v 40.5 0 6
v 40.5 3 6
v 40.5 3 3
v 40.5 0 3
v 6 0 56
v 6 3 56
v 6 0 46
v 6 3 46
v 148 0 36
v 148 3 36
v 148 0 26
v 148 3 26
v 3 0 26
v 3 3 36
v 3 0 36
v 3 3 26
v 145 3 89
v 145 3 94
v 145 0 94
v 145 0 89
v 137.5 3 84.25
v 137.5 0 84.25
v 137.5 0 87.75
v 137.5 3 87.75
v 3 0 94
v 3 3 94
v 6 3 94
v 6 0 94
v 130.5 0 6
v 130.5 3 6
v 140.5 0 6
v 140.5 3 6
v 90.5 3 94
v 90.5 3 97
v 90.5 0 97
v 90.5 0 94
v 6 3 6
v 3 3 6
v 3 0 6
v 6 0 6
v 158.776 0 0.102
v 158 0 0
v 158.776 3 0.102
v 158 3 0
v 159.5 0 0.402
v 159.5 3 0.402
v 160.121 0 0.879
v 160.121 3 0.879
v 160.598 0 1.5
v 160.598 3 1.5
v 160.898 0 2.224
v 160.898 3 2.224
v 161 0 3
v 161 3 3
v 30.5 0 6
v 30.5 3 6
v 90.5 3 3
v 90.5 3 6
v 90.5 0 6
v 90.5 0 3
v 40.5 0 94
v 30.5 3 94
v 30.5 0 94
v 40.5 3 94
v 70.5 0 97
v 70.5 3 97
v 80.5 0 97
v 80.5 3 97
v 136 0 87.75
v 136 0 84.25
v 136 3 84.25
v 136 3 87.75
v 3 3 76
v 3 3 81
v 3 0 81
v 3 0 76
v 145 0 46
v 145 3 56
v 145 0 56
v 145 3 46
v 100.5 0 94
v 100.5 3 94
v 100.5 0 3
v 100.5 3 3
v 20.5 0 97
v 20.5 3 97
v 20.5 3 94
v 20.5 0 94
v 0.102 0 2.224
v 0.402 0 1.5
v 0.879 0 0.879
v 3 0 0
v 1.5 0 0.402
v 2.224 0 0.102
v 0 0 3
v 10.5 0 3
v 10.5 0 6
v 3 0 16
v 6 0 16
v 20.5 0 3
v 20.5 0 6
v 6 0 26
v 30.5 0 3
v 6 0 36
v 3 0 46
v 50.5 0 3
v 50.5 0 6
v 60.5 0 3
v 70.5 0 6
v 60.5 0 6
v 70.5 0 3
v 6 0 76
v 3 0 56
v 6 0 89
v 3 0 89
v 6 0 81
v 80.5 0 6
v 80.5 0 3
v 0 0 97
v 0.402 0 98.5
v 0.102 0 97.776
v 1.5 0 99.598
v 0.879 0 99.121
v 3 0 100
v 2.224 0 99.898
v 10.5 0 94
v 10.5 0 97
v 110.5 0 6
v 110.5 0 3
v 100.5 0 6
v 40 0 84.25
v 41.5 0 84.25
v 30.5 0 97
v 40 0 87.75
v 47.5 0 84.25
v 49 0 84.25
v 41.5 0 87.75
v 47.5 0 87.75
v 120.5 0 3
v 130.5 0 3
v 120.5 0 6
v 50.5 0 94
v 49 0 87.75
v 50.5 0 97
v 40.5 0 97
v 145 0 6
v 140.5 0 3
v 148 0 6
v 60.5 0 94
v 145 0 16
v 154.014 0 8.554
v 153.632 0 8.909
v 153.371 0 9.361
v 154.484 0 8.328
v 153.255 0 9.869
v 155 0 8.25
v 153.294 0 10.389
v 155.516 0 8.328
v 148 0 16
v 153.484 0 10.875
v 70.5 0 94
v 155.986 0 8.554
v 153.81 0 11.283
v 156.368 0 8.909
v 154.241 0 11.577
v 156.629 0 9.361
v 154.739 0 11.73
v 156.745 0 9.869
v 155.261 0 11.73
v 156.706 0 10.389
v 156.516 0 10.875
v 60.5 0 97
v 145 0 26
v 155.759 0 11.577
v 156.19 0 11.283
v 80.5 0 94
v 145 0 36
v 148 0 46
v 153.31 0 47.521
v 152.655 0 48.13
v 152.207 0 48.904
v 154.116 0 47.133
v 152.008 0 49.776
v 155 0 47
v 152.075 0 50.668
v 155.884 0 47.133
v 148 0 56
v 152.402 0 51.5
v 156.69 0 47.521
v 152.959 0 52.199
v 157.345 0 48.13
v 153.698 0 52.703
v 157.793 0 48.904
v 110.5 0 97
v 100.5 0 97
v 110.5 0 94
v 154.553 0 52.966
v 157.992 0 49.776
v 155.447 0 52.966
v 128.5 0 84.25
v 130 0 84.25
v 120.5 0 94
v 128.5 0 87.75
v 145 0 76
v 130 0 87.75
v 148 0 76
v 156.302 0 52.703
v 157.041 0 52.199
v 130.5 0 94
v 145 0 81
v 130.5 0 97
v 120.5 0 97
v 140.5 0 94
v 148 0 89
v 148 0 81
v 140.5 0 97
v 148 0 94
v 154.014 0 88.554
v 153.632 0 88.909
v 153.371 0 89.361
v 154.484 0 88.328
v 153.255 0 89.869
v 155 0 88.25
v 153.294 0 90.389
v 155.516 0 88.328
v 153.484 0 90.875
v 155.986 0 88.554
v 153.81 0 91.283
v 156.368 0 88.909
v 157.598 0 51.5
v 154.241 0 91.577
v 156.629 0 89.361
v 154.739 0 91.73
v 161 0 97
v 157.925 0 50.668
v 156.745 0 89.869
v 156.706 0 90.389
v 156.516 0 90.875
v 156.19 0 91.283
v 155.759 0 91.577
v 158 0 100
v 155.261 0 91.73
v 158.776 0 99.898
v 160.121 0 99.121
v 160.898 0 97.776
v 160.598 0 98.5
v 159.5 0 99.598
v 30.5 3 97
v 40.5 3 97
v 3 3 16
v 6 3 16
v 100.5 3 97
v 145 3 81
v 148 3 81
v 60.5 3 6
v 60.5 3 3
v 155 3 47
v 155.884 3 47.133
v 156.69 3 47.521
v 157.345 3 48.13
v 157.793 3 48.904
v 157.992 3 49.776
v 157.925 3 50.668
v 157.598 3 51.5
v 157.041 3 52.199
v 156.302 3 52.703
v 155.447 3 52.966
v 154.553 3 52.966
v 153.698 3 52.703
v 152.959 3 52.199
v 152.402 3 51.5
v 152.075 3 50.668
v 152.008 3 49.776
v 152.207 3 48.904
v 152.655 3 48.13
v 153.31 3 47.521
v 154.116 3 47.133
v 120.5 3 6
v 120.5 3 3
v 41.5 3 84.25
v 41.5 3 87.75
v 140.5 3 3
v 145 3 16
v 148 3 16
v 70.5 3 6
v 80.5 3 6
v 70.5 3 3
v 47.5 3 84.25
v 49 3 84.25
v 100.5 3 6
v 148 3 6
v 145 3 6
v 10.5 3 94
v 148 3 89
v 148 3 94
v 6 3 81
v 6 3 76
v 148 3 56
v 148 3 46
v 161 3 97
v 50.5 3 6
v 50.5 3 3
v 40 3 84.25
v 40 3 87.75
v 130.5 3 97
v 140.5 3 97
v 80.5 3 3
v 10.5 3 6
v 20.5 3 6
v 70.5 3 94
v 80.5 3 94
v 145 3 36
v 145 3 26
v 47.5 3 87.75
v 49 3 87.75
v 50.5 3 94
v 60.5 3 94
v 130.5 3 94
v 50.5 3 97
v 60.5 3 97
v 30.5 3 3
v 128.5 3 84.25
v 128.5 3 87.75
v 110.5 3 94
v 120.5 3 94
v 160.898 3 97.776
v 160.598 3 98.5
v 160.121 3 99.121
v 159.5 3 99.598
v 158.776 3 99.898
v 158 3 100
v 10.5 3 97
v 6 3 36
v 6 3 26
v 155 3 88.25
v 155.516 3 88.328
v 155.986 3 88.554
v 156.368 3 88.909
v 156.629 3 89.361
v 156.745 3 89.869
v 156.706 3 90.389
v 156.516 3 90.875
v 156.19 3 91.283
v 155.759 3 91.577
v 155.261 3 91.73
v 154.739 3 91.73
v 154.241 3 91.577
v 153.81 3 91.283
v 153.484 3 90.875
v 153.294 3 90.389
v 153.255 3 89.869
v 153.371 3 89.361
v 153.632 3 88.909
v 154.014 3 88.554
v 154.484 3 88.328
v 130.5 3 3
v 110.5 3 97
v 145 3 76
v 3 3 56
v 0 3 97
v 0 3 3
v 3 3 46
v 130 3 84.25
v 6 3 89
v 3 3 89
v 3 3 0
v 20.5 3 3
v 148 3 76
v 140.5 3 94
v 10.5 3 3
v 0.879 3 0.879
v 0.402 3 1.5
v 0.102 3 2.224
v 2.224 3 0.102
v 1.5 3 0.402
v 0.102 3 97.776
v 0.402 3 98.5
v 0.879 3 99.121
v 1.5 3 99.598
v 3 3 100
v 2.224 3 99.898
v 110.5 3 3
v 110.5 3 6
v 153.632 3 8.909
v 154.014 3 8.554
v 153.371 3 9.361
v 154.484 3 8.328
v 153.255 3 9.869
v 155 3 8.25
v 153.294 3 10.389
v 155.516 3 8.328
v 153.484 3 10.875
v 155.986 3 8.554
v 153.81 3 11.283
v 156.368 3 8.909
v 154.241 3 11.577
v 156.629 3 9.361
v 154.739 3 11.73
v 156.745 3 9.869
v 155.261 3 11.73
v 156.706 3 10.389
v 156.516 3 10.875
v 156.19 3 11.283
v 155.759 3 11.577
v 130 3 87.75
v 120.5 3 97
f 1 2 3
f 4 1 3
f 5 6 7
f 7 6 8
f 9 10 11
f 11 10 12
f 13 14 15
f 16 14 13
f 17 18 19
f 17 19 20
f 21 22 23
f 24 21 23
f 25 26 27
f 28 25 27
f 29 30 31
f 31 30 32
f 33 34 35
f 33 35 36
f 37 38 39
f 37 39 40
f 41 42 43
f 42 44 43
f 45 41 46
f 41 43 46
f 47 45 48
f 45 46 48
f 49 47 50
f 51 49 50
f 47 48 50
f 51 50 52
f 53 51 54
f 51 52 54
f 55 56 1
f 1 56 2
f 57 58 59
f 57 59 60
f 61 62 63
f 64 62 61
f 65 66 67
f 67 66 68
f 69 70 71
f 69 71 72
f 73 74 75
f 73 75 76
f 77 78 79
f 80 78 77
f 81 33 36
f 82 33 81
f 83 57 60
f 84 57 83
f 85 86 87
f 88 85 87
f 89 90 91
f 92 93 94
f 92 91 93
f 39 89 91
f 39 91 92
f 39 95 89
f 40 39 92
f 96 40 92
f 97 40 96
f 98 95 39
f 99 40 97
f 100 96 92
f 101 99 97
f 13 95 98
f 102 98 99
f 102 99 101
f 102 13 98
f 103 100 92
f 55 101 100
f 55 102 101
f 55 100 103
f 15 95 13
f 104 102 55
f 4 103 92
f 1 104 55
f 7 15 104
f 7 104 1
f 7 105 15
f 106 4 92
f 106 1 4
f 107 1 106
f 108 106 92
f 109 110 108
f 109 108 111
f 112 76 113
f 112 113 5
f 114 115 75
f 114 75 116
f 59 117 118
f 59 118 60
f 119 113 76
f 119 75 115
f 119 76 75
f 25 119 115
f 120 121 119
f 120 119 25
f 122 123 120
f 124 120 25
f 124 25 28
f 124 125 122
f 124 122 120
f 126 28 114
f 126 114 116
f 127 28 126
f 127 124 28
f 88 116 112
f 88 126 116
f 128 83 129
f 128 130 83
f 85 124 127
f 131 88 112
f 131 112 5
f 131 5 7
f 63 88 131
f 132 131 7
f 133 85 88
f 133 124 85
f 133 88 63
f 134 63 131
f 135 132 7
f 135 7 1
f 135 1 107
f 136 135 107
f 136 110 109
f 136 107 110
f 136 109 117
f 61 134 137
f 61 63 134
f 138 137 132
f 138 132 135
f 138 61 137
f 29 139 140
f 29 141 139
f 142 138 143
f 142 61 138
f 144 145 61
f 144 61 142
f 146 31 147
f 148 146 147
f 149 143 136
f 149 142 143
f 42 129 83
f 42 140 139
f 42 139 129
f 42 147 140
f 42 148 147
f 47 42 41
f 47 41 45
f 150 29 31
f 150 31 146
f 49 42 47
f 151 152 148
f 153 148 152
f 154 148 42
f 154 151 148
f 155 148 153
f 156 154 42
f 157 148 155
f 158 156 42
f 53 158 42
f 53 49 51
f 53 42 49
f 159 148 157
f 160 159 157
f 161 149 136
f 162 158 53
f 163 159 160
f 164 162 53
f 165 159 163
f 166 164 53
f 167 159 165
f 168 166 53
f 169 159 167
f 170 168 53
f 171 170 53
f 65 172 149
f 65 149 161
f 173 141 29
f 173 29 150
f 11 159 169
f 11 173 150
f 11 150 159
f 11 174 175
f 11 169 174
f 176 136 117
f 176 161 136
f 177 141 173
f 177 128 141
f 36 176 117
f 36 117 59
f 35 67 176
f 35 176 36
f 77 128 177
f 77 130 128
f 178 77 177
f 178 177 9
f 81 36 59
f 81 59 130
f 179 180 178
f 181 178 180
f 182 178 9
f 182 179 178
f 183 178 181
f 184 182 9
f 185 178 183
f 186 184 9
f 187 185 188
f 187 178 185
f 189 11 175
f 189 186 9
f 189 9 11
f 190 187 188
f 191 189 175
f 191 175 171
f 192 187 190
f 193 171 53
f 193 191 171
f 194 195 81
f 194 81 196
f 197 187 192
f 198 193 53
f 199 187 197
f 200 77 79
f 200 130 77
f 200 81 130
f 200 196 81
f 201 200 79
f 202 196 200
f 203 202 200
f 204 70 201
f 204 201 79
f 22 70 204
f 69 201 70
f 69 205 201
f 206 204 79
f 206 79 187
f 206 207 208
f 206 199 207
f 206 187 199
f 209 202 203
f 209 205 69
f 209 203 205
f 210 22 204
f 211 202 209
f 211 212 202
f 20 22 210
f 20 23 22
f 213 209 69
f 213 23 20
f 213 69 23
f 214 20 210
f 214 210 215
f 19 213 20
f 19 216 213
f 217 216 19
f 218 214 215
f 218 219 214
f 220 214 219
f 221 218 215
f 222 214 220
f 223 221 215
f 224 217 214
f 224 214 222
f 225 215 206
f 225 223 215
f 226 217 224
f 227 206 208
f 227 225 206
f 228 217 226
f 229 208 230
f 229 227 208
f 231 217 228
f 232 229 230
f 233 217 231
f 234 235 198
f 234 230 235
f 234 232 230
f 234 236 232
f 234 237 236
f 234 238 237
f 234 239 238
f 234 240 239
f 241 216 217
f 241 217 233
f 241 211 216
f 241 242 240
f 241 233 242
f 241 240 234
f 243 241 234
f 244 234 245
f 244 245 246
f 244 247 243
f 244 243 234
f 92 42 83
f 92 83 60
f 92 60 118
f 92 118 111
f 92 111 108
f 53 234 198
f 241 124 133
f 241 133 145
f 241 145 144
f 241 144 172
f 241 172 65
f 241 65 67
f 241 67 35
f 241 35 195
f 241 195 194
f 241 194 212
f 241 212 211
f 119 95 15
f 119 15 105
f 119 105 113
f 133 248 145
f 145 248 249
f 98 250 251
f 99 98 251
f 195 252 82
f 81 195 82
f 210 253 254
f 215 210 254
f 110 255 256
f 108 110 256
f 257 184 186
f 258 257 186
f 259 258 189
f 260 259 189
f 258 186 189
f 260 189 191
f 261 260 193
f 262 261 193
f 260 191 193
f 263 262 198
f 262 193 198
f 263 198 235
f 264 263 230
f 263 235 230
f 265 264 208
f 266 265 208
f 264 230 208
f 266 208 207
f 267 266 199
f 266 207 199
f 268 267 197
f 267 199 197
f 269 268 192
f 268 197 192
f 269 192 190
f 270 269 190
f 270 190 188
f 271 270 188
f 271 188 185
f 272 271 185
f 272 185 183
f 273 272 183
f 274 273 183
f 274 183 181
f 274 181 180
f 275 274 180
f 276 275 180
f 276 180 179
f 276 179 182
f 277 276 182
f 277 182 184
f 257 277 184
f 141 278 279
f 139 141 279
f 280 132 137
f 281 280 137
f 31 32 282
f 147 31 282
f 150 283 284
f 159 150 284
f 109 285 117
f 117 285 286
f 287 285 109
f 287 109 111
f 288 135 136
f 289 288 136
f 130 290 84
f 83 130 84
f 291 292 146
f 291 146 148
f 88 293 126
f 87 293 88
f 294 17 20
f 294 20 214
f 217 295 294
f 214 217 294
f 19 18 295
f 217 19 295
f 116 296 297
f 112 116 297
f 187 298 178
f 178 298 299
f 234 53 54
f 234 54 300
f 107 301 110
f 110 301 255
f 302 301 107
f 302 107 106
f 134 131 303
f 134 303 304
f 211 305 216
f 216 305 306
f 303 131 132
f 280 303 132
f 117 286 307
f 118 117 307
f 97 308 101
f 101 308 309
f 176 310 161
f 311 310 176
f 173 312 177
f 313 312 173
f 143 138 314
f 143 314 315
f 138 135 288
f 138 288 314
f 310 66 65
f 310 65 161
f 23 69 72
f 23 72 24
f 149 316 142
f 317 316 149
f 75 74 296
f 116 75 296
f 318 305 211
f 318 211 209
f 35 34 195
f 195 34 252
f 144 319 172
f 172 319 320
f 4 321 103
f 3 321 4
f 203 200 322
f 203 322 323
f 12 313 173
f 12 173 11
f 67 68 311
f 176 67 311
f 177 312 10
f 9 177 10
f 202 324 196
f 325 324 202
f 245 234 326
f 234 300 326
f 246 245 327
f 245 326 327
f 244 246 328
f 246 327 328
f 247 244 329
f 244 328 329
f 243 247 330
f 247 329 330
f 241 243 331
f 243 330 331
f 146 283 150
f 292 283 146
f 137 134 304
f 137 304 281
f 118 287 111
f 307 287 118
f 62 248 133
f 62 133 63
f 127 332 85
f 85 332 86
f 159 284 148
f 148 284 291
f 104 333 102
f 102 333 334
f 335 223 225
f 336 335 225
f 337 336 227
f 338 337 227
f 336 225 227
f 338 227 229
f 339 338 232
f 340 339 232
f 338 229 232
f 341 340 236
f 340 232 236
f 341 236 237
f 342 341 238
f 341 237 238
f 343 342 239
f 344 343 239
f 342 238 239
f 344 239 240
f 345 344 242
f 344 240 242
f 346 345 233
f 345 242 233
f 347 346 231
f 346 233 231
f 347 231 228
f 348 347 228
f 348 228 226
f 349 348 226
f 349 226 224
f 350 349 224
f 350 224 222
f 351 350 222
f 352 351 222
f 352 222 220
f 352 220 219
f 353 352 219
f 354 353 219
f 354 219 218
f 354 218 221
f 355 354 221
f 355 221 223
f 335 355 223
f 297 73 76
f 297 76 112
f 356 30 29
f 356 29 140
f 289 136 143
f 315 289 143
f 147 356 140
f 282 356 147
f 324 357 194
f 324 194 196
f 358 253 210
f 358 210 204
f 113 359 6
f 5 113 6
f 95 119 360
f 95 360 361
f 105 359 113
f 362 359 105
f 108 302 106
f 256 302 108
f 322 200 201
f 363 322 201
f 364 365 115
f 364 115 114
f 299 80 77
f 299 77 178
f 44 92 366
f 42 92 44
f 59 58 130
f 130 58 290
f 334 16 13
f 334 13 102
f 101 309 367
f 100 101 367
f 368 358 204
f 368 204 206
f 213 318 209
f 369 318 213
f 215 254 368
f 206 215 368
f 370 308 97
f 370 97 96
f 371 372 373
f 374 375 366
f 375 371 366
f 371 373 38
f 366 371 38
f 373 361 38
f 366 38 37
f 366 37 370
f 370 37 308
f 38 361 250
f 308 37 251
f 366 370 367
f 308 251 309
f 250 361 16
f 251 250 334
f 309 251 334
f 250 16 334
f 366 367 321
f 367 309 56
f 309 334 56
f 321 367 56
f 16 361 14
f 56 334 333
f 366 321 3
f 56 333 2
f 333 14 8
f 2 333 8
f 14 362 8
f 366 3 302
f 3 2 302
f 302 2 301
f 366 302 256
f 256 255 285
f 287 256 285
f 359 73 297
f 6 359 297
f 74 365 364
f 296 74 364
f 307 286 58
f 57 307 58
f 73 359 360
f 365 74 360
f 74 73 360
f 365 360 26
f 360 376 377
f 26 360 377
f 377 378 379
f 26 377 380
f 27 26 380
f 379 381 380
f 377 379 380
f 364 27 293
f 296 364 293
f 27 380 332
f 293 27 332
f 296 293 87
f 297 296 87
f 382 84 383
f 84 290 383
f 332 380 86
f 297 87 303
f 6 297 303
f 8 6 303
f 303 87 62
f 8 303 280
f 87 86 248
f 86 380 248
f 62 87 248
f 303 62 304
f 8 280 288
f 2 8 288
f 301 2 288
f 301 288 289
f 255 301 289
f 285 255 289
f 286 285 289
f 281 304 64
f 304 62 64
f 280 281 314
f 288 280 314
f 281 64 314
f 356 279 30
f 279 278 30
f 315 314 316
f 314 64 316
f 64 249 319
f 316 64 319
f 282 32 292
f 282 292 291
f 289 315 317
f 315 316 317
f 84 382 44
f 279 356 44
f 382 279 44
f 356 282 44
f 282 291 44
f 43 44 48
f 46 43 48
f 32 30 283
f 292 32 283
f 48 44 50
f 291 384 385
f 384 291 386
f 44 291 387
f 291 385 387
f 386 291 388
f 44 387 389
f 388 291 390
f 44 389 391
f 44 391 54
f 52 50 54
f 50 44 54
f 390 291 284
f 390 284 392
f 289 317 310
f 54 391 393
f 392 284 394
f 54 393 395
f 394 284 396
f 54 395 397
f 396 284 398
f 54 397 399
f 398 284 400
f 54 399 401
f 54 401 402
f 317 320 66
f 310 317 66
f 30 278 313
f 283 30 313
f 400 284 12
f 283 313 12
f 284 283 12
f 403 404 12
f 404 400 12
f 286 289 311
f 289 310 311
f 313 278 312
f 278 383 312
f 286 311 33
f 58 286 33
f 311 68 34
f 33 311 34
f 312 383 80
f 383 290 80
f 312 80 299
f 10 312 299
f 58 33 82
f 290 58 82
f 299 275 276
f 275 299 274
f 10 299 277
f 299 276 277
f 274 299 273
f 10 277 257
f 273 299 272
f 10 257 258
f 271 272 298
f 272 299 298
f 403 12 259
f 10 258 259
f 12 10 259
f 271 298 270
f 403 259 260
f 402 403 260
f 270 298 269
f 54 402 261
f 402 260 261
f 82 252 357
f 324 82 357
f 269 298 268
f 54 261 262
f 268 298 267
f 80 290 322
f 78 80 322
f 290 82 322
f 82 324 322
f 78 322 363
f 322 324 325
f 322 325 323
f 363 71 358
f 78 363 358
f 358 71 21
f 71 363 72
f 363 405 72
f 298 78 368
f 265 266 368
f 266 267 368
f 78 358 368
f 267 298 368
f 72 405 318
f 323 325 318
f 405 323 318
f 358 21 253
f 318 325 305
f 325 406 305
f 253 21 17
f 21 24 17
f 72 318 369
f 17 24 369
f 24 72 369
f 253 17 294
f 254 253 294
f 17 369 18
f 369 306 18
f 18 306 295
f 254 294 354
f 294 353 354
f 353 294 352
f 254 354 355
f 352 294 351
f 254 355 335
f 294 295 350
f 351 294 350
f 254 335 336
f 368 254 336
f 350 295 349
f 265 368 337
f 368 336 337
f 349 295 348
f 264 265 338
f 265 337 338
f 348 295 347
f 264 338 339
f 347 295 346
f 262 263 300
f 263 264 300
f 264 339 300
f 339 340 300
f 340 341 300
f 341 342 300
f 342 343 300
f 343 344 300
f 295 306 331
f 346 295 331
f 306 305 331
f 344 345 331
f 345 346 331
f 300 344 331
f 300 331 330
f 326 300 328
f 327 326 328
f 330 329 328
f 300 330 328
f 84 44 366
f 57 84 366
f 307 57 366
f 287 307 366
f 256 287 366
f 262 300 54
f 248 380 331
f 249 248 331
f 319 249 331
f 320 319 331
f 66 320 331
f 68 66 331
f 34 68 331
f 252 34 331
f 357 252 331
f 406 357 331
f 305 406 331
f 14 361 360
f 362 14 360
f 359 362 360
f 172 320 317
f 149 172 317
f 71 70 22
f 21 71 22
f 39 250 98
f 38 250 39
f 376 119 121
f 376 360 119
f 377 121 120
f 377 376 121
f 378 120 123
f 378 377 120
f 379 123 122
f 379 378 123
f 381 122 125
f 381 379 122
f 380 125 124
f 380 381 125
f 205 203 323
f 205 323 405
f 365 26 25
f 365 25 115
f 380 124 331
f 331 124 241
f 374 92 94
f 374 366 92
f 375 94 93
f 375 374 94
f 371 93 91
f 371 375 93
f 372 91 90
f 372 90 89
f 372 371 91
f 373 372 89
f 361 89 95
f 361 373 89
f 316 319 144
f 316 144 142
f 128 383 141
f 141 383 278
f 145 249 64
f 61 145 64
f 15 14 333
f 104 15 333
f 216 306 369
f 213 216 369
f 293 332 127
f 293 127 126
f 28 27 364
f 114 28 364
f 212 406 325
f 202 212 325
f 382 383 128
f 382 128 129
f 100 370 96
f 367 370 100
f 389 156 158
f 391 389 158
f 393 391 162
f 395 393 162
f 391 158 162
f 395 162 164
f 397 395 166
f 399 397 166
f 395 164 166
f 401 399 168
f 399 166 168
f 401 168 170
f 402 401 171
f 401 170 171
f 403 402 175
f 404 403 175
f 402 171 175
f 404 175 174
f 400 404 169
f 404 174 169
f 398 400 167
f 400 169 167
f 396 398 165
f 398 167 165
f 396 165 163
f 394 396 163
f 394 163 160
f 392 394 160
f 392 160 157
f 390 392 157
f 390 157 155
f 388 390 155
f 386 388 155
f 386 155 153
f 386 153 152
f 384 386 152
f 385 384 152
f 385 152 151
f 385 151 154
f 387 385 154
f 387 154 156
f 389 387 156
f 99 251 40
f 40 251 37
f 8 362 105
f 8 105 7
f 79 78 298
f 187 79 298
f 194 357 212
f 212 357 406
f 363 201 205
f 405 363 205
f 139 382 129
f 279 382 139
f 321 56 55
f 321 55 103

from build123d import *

# Parameters (mm, degrees)
SKETCH1_W           = 151
SKETCH1_H           = 100
BOSS_EXTRUDE1_DEPTH = 3
SKETCH3_W           = 1.5
SKETCH3_H           = 3.5
CUT_EXTRUDE1_DEPTH  = 182.13530854
SKETCH4_W           = 10
SKETCH4_H           = 100
BOSS_EXTRUDE2_DEPTH = 3
SKETCH5_R           = 3
SKETCH5_R_2         = 1.75
CUT_EXTRUDE2_DEPTH  = 190.552103655
FILLET1_R           = 3
FILLET2_R           = 3
SKETCH6_W           = 3
SKETCH6_H           = 5
SKETCH6_H_2         = 10
SKETCH6_W_2         = 10
SKETCH6_H_3         = 3
CUT_EXTRUDE3_DEPTH  = 190.552103655


with BuildPart() as part:
    # Sketch1 → Boss-Extrude1 (new body)
    with BuildSketch(Plane(origin=(0, 0, 0), x_dir=(1, 0, 0), z_dir=(0, 1, 0))):
        with Locations((75.5, -50)):
            Rectangle(SKETCH1_W, SKETCH1_H)
    extrude(amount=BOSS_EXTRUDE1_DEPTH)

    # Sketch3 → Cut-Extrude1 (cut, through all)
    with BuildSketch(Plane.XZ):
        with Locations((40.75, 86)):
            Rectangle(SKETCH3_W, SKETCH3_H)
        with Locations((48.25, 86)):
            Rectangle(SKETCH3_W, SKETCH3_H)
        with Locations((129.25, 86)):
            Rectangle(SKETCH3_W, SKETCH3_H)
        with Locations((136.75, 86)):
            Rectangle(SKETCH3_W, SKETCH3_H)
    extrude(amount=-CUT_EXTRUDE1_DEPTH, mode=Mode.SUBTRACT)

    # Sketch4 → Boss-Extrude2 (add, through all)
    with BuildSketch(Plane.XZ):
        with Locations((156, 50)):
            Rectangle(SKETCH4_W, SKETCH4_H)
    extrude(amount=-BOSS_EXTRUDE2_DEPTH)

    # Sketch5 → Cut-Extrude2 (cut, through all)
    with BuildSketch(Plane.XZ):
        with Locations(Location((155, 50, 0), (0, 0, 270))):
            Circle(SKETCH5_R)
        with Locations(Location((155, 90, 0), (0, 0, 270))):
            Circle(SKETCH5_R_2)
        with Locations(Location((155, 10, 0), (0, 0, 270))):
            Circle(SKETCH5_R_2)
    extrude(amount=-CUT_EXTRUDE2_DEPTH, mode=Mode.SUBTRACT)

    # Fillet1
    fillet1_edges = [part.edges().sort_by_distance(p)[0] for p in [
        (0, 1.5, 0),
        (0, 1.5, 100),
    ]]
    fillet(fillet1_edges, radius=FILLET1_R)

    # Fillet2
    fillet2_edges = [part.edges().sort_by_distance(p)[0] for p in [
        (161, 1.5, 100),
        (161, 1.5, 0),
    ]]
    fillet(fillet2_edges, radius=FILLET2_R)

    # Sketch6 → Cut-Extrude3 (cut, through all)
    with BuildSketch(Plane(origin=(0, 3, 0), x_dir=(1, 0, 0), z_dir=(0, 1, 0))):
        with Locations((146.5, -91.5)):
            Rectangle(SKETCH6_W, SKETCH6_H)
        with Locations((146.5, -78.5)):
            Rectangle(SKETCH6_W, SKETCH6_H)
        with Locations((146.5, -51)):
            Rectangle(SKETCH6_W, SKETCH6_H_2)
        with Locations((146.5, -31)):
            Rectangle(SKETCH6_W, SKETCH6_H_2)
        with Locations((146.5, -11)):
            Rectangle(SKETCH6_W, SKETCH6_H_2)
        with Locations((135.5, -4.5)):
            Rectangle(SKETCH6_W_2, SKETCH6_H_3)
        with Locations((115.5, -4.5)):
            Rectangle(SKETCH6_W_2, SKETCH6_H_3)
        with Locations((95.5, -4.5)):
            Rectangle(SKETCH6_W_2, SKETCH6_H_3)
        with Locations((75.5, -4.5)):
            Rectangle(SKETCH6_W_2, SKETCH6_H_3)
        with Locations((55.5, -4.5)):
            Rectangle(SKETCH6_W_2, SKETCH6_H_3)
        with Locations((35.5, -4.5)):
            Rectangle(SKETCH6_W_2, SKETCH6_H_3)
        with Locations((15.5, -4.5)):
            Rectangle(SKETCH6_W_2, SKETCH6_H_3)
        with Locations((4.5, -11)):
            Rectangle(SKETCH6_W, SKETCH6_H_2)
        with Locations((4.5, -31)):
            Rectangle(SKETCH6_W, SKETCH6_H_2)
        with Locations((4.5, -51)):
            Rectangle(SKETCH6_W, SKETCH6_H_2)
        with Locations((4.5, -78.5)):
            Rectangle(SKETCH6_W, SKETCH6_H)
        with Locations((4.5, -91.5)):
            Rectangle(SKETCH6_W, SKETCH6_H)
        with Locations((15.5, -95.5)):
            Rectangle(SKETCH6_W_2, SKETCH6_H_3)
        with Locations((35.5, -95.5)):
            Rectangle(SKETCH6_W_2, SKETCH6_H_3)
        with Locations((55.5, -95.5)):
            Rectangle(SKETCH6_W_2, SKETCH6_H_3)
        with Locations((75.5, -95.5)):
            Rectangle(SKETCH6_W_2, SKETCH6_H_3)
        with Locations((95.5, -95.5)):
            Rectangle(SKETCH6_W_2, SKETCH6_H_3)
        with Locations((115.5, -95.5)):
            Rectangle(SKETCH6_W_2, SKETCH6_H_3)
        with Locations((135.5, -95.5)):
            Rectangle(SKETCH6_W_2, SKETCH6_H_3)
    extrude(amount=-CUT_EXTRUDE3_DEPTH, mode=Mode.SUBTRACT)


solid = part.part
